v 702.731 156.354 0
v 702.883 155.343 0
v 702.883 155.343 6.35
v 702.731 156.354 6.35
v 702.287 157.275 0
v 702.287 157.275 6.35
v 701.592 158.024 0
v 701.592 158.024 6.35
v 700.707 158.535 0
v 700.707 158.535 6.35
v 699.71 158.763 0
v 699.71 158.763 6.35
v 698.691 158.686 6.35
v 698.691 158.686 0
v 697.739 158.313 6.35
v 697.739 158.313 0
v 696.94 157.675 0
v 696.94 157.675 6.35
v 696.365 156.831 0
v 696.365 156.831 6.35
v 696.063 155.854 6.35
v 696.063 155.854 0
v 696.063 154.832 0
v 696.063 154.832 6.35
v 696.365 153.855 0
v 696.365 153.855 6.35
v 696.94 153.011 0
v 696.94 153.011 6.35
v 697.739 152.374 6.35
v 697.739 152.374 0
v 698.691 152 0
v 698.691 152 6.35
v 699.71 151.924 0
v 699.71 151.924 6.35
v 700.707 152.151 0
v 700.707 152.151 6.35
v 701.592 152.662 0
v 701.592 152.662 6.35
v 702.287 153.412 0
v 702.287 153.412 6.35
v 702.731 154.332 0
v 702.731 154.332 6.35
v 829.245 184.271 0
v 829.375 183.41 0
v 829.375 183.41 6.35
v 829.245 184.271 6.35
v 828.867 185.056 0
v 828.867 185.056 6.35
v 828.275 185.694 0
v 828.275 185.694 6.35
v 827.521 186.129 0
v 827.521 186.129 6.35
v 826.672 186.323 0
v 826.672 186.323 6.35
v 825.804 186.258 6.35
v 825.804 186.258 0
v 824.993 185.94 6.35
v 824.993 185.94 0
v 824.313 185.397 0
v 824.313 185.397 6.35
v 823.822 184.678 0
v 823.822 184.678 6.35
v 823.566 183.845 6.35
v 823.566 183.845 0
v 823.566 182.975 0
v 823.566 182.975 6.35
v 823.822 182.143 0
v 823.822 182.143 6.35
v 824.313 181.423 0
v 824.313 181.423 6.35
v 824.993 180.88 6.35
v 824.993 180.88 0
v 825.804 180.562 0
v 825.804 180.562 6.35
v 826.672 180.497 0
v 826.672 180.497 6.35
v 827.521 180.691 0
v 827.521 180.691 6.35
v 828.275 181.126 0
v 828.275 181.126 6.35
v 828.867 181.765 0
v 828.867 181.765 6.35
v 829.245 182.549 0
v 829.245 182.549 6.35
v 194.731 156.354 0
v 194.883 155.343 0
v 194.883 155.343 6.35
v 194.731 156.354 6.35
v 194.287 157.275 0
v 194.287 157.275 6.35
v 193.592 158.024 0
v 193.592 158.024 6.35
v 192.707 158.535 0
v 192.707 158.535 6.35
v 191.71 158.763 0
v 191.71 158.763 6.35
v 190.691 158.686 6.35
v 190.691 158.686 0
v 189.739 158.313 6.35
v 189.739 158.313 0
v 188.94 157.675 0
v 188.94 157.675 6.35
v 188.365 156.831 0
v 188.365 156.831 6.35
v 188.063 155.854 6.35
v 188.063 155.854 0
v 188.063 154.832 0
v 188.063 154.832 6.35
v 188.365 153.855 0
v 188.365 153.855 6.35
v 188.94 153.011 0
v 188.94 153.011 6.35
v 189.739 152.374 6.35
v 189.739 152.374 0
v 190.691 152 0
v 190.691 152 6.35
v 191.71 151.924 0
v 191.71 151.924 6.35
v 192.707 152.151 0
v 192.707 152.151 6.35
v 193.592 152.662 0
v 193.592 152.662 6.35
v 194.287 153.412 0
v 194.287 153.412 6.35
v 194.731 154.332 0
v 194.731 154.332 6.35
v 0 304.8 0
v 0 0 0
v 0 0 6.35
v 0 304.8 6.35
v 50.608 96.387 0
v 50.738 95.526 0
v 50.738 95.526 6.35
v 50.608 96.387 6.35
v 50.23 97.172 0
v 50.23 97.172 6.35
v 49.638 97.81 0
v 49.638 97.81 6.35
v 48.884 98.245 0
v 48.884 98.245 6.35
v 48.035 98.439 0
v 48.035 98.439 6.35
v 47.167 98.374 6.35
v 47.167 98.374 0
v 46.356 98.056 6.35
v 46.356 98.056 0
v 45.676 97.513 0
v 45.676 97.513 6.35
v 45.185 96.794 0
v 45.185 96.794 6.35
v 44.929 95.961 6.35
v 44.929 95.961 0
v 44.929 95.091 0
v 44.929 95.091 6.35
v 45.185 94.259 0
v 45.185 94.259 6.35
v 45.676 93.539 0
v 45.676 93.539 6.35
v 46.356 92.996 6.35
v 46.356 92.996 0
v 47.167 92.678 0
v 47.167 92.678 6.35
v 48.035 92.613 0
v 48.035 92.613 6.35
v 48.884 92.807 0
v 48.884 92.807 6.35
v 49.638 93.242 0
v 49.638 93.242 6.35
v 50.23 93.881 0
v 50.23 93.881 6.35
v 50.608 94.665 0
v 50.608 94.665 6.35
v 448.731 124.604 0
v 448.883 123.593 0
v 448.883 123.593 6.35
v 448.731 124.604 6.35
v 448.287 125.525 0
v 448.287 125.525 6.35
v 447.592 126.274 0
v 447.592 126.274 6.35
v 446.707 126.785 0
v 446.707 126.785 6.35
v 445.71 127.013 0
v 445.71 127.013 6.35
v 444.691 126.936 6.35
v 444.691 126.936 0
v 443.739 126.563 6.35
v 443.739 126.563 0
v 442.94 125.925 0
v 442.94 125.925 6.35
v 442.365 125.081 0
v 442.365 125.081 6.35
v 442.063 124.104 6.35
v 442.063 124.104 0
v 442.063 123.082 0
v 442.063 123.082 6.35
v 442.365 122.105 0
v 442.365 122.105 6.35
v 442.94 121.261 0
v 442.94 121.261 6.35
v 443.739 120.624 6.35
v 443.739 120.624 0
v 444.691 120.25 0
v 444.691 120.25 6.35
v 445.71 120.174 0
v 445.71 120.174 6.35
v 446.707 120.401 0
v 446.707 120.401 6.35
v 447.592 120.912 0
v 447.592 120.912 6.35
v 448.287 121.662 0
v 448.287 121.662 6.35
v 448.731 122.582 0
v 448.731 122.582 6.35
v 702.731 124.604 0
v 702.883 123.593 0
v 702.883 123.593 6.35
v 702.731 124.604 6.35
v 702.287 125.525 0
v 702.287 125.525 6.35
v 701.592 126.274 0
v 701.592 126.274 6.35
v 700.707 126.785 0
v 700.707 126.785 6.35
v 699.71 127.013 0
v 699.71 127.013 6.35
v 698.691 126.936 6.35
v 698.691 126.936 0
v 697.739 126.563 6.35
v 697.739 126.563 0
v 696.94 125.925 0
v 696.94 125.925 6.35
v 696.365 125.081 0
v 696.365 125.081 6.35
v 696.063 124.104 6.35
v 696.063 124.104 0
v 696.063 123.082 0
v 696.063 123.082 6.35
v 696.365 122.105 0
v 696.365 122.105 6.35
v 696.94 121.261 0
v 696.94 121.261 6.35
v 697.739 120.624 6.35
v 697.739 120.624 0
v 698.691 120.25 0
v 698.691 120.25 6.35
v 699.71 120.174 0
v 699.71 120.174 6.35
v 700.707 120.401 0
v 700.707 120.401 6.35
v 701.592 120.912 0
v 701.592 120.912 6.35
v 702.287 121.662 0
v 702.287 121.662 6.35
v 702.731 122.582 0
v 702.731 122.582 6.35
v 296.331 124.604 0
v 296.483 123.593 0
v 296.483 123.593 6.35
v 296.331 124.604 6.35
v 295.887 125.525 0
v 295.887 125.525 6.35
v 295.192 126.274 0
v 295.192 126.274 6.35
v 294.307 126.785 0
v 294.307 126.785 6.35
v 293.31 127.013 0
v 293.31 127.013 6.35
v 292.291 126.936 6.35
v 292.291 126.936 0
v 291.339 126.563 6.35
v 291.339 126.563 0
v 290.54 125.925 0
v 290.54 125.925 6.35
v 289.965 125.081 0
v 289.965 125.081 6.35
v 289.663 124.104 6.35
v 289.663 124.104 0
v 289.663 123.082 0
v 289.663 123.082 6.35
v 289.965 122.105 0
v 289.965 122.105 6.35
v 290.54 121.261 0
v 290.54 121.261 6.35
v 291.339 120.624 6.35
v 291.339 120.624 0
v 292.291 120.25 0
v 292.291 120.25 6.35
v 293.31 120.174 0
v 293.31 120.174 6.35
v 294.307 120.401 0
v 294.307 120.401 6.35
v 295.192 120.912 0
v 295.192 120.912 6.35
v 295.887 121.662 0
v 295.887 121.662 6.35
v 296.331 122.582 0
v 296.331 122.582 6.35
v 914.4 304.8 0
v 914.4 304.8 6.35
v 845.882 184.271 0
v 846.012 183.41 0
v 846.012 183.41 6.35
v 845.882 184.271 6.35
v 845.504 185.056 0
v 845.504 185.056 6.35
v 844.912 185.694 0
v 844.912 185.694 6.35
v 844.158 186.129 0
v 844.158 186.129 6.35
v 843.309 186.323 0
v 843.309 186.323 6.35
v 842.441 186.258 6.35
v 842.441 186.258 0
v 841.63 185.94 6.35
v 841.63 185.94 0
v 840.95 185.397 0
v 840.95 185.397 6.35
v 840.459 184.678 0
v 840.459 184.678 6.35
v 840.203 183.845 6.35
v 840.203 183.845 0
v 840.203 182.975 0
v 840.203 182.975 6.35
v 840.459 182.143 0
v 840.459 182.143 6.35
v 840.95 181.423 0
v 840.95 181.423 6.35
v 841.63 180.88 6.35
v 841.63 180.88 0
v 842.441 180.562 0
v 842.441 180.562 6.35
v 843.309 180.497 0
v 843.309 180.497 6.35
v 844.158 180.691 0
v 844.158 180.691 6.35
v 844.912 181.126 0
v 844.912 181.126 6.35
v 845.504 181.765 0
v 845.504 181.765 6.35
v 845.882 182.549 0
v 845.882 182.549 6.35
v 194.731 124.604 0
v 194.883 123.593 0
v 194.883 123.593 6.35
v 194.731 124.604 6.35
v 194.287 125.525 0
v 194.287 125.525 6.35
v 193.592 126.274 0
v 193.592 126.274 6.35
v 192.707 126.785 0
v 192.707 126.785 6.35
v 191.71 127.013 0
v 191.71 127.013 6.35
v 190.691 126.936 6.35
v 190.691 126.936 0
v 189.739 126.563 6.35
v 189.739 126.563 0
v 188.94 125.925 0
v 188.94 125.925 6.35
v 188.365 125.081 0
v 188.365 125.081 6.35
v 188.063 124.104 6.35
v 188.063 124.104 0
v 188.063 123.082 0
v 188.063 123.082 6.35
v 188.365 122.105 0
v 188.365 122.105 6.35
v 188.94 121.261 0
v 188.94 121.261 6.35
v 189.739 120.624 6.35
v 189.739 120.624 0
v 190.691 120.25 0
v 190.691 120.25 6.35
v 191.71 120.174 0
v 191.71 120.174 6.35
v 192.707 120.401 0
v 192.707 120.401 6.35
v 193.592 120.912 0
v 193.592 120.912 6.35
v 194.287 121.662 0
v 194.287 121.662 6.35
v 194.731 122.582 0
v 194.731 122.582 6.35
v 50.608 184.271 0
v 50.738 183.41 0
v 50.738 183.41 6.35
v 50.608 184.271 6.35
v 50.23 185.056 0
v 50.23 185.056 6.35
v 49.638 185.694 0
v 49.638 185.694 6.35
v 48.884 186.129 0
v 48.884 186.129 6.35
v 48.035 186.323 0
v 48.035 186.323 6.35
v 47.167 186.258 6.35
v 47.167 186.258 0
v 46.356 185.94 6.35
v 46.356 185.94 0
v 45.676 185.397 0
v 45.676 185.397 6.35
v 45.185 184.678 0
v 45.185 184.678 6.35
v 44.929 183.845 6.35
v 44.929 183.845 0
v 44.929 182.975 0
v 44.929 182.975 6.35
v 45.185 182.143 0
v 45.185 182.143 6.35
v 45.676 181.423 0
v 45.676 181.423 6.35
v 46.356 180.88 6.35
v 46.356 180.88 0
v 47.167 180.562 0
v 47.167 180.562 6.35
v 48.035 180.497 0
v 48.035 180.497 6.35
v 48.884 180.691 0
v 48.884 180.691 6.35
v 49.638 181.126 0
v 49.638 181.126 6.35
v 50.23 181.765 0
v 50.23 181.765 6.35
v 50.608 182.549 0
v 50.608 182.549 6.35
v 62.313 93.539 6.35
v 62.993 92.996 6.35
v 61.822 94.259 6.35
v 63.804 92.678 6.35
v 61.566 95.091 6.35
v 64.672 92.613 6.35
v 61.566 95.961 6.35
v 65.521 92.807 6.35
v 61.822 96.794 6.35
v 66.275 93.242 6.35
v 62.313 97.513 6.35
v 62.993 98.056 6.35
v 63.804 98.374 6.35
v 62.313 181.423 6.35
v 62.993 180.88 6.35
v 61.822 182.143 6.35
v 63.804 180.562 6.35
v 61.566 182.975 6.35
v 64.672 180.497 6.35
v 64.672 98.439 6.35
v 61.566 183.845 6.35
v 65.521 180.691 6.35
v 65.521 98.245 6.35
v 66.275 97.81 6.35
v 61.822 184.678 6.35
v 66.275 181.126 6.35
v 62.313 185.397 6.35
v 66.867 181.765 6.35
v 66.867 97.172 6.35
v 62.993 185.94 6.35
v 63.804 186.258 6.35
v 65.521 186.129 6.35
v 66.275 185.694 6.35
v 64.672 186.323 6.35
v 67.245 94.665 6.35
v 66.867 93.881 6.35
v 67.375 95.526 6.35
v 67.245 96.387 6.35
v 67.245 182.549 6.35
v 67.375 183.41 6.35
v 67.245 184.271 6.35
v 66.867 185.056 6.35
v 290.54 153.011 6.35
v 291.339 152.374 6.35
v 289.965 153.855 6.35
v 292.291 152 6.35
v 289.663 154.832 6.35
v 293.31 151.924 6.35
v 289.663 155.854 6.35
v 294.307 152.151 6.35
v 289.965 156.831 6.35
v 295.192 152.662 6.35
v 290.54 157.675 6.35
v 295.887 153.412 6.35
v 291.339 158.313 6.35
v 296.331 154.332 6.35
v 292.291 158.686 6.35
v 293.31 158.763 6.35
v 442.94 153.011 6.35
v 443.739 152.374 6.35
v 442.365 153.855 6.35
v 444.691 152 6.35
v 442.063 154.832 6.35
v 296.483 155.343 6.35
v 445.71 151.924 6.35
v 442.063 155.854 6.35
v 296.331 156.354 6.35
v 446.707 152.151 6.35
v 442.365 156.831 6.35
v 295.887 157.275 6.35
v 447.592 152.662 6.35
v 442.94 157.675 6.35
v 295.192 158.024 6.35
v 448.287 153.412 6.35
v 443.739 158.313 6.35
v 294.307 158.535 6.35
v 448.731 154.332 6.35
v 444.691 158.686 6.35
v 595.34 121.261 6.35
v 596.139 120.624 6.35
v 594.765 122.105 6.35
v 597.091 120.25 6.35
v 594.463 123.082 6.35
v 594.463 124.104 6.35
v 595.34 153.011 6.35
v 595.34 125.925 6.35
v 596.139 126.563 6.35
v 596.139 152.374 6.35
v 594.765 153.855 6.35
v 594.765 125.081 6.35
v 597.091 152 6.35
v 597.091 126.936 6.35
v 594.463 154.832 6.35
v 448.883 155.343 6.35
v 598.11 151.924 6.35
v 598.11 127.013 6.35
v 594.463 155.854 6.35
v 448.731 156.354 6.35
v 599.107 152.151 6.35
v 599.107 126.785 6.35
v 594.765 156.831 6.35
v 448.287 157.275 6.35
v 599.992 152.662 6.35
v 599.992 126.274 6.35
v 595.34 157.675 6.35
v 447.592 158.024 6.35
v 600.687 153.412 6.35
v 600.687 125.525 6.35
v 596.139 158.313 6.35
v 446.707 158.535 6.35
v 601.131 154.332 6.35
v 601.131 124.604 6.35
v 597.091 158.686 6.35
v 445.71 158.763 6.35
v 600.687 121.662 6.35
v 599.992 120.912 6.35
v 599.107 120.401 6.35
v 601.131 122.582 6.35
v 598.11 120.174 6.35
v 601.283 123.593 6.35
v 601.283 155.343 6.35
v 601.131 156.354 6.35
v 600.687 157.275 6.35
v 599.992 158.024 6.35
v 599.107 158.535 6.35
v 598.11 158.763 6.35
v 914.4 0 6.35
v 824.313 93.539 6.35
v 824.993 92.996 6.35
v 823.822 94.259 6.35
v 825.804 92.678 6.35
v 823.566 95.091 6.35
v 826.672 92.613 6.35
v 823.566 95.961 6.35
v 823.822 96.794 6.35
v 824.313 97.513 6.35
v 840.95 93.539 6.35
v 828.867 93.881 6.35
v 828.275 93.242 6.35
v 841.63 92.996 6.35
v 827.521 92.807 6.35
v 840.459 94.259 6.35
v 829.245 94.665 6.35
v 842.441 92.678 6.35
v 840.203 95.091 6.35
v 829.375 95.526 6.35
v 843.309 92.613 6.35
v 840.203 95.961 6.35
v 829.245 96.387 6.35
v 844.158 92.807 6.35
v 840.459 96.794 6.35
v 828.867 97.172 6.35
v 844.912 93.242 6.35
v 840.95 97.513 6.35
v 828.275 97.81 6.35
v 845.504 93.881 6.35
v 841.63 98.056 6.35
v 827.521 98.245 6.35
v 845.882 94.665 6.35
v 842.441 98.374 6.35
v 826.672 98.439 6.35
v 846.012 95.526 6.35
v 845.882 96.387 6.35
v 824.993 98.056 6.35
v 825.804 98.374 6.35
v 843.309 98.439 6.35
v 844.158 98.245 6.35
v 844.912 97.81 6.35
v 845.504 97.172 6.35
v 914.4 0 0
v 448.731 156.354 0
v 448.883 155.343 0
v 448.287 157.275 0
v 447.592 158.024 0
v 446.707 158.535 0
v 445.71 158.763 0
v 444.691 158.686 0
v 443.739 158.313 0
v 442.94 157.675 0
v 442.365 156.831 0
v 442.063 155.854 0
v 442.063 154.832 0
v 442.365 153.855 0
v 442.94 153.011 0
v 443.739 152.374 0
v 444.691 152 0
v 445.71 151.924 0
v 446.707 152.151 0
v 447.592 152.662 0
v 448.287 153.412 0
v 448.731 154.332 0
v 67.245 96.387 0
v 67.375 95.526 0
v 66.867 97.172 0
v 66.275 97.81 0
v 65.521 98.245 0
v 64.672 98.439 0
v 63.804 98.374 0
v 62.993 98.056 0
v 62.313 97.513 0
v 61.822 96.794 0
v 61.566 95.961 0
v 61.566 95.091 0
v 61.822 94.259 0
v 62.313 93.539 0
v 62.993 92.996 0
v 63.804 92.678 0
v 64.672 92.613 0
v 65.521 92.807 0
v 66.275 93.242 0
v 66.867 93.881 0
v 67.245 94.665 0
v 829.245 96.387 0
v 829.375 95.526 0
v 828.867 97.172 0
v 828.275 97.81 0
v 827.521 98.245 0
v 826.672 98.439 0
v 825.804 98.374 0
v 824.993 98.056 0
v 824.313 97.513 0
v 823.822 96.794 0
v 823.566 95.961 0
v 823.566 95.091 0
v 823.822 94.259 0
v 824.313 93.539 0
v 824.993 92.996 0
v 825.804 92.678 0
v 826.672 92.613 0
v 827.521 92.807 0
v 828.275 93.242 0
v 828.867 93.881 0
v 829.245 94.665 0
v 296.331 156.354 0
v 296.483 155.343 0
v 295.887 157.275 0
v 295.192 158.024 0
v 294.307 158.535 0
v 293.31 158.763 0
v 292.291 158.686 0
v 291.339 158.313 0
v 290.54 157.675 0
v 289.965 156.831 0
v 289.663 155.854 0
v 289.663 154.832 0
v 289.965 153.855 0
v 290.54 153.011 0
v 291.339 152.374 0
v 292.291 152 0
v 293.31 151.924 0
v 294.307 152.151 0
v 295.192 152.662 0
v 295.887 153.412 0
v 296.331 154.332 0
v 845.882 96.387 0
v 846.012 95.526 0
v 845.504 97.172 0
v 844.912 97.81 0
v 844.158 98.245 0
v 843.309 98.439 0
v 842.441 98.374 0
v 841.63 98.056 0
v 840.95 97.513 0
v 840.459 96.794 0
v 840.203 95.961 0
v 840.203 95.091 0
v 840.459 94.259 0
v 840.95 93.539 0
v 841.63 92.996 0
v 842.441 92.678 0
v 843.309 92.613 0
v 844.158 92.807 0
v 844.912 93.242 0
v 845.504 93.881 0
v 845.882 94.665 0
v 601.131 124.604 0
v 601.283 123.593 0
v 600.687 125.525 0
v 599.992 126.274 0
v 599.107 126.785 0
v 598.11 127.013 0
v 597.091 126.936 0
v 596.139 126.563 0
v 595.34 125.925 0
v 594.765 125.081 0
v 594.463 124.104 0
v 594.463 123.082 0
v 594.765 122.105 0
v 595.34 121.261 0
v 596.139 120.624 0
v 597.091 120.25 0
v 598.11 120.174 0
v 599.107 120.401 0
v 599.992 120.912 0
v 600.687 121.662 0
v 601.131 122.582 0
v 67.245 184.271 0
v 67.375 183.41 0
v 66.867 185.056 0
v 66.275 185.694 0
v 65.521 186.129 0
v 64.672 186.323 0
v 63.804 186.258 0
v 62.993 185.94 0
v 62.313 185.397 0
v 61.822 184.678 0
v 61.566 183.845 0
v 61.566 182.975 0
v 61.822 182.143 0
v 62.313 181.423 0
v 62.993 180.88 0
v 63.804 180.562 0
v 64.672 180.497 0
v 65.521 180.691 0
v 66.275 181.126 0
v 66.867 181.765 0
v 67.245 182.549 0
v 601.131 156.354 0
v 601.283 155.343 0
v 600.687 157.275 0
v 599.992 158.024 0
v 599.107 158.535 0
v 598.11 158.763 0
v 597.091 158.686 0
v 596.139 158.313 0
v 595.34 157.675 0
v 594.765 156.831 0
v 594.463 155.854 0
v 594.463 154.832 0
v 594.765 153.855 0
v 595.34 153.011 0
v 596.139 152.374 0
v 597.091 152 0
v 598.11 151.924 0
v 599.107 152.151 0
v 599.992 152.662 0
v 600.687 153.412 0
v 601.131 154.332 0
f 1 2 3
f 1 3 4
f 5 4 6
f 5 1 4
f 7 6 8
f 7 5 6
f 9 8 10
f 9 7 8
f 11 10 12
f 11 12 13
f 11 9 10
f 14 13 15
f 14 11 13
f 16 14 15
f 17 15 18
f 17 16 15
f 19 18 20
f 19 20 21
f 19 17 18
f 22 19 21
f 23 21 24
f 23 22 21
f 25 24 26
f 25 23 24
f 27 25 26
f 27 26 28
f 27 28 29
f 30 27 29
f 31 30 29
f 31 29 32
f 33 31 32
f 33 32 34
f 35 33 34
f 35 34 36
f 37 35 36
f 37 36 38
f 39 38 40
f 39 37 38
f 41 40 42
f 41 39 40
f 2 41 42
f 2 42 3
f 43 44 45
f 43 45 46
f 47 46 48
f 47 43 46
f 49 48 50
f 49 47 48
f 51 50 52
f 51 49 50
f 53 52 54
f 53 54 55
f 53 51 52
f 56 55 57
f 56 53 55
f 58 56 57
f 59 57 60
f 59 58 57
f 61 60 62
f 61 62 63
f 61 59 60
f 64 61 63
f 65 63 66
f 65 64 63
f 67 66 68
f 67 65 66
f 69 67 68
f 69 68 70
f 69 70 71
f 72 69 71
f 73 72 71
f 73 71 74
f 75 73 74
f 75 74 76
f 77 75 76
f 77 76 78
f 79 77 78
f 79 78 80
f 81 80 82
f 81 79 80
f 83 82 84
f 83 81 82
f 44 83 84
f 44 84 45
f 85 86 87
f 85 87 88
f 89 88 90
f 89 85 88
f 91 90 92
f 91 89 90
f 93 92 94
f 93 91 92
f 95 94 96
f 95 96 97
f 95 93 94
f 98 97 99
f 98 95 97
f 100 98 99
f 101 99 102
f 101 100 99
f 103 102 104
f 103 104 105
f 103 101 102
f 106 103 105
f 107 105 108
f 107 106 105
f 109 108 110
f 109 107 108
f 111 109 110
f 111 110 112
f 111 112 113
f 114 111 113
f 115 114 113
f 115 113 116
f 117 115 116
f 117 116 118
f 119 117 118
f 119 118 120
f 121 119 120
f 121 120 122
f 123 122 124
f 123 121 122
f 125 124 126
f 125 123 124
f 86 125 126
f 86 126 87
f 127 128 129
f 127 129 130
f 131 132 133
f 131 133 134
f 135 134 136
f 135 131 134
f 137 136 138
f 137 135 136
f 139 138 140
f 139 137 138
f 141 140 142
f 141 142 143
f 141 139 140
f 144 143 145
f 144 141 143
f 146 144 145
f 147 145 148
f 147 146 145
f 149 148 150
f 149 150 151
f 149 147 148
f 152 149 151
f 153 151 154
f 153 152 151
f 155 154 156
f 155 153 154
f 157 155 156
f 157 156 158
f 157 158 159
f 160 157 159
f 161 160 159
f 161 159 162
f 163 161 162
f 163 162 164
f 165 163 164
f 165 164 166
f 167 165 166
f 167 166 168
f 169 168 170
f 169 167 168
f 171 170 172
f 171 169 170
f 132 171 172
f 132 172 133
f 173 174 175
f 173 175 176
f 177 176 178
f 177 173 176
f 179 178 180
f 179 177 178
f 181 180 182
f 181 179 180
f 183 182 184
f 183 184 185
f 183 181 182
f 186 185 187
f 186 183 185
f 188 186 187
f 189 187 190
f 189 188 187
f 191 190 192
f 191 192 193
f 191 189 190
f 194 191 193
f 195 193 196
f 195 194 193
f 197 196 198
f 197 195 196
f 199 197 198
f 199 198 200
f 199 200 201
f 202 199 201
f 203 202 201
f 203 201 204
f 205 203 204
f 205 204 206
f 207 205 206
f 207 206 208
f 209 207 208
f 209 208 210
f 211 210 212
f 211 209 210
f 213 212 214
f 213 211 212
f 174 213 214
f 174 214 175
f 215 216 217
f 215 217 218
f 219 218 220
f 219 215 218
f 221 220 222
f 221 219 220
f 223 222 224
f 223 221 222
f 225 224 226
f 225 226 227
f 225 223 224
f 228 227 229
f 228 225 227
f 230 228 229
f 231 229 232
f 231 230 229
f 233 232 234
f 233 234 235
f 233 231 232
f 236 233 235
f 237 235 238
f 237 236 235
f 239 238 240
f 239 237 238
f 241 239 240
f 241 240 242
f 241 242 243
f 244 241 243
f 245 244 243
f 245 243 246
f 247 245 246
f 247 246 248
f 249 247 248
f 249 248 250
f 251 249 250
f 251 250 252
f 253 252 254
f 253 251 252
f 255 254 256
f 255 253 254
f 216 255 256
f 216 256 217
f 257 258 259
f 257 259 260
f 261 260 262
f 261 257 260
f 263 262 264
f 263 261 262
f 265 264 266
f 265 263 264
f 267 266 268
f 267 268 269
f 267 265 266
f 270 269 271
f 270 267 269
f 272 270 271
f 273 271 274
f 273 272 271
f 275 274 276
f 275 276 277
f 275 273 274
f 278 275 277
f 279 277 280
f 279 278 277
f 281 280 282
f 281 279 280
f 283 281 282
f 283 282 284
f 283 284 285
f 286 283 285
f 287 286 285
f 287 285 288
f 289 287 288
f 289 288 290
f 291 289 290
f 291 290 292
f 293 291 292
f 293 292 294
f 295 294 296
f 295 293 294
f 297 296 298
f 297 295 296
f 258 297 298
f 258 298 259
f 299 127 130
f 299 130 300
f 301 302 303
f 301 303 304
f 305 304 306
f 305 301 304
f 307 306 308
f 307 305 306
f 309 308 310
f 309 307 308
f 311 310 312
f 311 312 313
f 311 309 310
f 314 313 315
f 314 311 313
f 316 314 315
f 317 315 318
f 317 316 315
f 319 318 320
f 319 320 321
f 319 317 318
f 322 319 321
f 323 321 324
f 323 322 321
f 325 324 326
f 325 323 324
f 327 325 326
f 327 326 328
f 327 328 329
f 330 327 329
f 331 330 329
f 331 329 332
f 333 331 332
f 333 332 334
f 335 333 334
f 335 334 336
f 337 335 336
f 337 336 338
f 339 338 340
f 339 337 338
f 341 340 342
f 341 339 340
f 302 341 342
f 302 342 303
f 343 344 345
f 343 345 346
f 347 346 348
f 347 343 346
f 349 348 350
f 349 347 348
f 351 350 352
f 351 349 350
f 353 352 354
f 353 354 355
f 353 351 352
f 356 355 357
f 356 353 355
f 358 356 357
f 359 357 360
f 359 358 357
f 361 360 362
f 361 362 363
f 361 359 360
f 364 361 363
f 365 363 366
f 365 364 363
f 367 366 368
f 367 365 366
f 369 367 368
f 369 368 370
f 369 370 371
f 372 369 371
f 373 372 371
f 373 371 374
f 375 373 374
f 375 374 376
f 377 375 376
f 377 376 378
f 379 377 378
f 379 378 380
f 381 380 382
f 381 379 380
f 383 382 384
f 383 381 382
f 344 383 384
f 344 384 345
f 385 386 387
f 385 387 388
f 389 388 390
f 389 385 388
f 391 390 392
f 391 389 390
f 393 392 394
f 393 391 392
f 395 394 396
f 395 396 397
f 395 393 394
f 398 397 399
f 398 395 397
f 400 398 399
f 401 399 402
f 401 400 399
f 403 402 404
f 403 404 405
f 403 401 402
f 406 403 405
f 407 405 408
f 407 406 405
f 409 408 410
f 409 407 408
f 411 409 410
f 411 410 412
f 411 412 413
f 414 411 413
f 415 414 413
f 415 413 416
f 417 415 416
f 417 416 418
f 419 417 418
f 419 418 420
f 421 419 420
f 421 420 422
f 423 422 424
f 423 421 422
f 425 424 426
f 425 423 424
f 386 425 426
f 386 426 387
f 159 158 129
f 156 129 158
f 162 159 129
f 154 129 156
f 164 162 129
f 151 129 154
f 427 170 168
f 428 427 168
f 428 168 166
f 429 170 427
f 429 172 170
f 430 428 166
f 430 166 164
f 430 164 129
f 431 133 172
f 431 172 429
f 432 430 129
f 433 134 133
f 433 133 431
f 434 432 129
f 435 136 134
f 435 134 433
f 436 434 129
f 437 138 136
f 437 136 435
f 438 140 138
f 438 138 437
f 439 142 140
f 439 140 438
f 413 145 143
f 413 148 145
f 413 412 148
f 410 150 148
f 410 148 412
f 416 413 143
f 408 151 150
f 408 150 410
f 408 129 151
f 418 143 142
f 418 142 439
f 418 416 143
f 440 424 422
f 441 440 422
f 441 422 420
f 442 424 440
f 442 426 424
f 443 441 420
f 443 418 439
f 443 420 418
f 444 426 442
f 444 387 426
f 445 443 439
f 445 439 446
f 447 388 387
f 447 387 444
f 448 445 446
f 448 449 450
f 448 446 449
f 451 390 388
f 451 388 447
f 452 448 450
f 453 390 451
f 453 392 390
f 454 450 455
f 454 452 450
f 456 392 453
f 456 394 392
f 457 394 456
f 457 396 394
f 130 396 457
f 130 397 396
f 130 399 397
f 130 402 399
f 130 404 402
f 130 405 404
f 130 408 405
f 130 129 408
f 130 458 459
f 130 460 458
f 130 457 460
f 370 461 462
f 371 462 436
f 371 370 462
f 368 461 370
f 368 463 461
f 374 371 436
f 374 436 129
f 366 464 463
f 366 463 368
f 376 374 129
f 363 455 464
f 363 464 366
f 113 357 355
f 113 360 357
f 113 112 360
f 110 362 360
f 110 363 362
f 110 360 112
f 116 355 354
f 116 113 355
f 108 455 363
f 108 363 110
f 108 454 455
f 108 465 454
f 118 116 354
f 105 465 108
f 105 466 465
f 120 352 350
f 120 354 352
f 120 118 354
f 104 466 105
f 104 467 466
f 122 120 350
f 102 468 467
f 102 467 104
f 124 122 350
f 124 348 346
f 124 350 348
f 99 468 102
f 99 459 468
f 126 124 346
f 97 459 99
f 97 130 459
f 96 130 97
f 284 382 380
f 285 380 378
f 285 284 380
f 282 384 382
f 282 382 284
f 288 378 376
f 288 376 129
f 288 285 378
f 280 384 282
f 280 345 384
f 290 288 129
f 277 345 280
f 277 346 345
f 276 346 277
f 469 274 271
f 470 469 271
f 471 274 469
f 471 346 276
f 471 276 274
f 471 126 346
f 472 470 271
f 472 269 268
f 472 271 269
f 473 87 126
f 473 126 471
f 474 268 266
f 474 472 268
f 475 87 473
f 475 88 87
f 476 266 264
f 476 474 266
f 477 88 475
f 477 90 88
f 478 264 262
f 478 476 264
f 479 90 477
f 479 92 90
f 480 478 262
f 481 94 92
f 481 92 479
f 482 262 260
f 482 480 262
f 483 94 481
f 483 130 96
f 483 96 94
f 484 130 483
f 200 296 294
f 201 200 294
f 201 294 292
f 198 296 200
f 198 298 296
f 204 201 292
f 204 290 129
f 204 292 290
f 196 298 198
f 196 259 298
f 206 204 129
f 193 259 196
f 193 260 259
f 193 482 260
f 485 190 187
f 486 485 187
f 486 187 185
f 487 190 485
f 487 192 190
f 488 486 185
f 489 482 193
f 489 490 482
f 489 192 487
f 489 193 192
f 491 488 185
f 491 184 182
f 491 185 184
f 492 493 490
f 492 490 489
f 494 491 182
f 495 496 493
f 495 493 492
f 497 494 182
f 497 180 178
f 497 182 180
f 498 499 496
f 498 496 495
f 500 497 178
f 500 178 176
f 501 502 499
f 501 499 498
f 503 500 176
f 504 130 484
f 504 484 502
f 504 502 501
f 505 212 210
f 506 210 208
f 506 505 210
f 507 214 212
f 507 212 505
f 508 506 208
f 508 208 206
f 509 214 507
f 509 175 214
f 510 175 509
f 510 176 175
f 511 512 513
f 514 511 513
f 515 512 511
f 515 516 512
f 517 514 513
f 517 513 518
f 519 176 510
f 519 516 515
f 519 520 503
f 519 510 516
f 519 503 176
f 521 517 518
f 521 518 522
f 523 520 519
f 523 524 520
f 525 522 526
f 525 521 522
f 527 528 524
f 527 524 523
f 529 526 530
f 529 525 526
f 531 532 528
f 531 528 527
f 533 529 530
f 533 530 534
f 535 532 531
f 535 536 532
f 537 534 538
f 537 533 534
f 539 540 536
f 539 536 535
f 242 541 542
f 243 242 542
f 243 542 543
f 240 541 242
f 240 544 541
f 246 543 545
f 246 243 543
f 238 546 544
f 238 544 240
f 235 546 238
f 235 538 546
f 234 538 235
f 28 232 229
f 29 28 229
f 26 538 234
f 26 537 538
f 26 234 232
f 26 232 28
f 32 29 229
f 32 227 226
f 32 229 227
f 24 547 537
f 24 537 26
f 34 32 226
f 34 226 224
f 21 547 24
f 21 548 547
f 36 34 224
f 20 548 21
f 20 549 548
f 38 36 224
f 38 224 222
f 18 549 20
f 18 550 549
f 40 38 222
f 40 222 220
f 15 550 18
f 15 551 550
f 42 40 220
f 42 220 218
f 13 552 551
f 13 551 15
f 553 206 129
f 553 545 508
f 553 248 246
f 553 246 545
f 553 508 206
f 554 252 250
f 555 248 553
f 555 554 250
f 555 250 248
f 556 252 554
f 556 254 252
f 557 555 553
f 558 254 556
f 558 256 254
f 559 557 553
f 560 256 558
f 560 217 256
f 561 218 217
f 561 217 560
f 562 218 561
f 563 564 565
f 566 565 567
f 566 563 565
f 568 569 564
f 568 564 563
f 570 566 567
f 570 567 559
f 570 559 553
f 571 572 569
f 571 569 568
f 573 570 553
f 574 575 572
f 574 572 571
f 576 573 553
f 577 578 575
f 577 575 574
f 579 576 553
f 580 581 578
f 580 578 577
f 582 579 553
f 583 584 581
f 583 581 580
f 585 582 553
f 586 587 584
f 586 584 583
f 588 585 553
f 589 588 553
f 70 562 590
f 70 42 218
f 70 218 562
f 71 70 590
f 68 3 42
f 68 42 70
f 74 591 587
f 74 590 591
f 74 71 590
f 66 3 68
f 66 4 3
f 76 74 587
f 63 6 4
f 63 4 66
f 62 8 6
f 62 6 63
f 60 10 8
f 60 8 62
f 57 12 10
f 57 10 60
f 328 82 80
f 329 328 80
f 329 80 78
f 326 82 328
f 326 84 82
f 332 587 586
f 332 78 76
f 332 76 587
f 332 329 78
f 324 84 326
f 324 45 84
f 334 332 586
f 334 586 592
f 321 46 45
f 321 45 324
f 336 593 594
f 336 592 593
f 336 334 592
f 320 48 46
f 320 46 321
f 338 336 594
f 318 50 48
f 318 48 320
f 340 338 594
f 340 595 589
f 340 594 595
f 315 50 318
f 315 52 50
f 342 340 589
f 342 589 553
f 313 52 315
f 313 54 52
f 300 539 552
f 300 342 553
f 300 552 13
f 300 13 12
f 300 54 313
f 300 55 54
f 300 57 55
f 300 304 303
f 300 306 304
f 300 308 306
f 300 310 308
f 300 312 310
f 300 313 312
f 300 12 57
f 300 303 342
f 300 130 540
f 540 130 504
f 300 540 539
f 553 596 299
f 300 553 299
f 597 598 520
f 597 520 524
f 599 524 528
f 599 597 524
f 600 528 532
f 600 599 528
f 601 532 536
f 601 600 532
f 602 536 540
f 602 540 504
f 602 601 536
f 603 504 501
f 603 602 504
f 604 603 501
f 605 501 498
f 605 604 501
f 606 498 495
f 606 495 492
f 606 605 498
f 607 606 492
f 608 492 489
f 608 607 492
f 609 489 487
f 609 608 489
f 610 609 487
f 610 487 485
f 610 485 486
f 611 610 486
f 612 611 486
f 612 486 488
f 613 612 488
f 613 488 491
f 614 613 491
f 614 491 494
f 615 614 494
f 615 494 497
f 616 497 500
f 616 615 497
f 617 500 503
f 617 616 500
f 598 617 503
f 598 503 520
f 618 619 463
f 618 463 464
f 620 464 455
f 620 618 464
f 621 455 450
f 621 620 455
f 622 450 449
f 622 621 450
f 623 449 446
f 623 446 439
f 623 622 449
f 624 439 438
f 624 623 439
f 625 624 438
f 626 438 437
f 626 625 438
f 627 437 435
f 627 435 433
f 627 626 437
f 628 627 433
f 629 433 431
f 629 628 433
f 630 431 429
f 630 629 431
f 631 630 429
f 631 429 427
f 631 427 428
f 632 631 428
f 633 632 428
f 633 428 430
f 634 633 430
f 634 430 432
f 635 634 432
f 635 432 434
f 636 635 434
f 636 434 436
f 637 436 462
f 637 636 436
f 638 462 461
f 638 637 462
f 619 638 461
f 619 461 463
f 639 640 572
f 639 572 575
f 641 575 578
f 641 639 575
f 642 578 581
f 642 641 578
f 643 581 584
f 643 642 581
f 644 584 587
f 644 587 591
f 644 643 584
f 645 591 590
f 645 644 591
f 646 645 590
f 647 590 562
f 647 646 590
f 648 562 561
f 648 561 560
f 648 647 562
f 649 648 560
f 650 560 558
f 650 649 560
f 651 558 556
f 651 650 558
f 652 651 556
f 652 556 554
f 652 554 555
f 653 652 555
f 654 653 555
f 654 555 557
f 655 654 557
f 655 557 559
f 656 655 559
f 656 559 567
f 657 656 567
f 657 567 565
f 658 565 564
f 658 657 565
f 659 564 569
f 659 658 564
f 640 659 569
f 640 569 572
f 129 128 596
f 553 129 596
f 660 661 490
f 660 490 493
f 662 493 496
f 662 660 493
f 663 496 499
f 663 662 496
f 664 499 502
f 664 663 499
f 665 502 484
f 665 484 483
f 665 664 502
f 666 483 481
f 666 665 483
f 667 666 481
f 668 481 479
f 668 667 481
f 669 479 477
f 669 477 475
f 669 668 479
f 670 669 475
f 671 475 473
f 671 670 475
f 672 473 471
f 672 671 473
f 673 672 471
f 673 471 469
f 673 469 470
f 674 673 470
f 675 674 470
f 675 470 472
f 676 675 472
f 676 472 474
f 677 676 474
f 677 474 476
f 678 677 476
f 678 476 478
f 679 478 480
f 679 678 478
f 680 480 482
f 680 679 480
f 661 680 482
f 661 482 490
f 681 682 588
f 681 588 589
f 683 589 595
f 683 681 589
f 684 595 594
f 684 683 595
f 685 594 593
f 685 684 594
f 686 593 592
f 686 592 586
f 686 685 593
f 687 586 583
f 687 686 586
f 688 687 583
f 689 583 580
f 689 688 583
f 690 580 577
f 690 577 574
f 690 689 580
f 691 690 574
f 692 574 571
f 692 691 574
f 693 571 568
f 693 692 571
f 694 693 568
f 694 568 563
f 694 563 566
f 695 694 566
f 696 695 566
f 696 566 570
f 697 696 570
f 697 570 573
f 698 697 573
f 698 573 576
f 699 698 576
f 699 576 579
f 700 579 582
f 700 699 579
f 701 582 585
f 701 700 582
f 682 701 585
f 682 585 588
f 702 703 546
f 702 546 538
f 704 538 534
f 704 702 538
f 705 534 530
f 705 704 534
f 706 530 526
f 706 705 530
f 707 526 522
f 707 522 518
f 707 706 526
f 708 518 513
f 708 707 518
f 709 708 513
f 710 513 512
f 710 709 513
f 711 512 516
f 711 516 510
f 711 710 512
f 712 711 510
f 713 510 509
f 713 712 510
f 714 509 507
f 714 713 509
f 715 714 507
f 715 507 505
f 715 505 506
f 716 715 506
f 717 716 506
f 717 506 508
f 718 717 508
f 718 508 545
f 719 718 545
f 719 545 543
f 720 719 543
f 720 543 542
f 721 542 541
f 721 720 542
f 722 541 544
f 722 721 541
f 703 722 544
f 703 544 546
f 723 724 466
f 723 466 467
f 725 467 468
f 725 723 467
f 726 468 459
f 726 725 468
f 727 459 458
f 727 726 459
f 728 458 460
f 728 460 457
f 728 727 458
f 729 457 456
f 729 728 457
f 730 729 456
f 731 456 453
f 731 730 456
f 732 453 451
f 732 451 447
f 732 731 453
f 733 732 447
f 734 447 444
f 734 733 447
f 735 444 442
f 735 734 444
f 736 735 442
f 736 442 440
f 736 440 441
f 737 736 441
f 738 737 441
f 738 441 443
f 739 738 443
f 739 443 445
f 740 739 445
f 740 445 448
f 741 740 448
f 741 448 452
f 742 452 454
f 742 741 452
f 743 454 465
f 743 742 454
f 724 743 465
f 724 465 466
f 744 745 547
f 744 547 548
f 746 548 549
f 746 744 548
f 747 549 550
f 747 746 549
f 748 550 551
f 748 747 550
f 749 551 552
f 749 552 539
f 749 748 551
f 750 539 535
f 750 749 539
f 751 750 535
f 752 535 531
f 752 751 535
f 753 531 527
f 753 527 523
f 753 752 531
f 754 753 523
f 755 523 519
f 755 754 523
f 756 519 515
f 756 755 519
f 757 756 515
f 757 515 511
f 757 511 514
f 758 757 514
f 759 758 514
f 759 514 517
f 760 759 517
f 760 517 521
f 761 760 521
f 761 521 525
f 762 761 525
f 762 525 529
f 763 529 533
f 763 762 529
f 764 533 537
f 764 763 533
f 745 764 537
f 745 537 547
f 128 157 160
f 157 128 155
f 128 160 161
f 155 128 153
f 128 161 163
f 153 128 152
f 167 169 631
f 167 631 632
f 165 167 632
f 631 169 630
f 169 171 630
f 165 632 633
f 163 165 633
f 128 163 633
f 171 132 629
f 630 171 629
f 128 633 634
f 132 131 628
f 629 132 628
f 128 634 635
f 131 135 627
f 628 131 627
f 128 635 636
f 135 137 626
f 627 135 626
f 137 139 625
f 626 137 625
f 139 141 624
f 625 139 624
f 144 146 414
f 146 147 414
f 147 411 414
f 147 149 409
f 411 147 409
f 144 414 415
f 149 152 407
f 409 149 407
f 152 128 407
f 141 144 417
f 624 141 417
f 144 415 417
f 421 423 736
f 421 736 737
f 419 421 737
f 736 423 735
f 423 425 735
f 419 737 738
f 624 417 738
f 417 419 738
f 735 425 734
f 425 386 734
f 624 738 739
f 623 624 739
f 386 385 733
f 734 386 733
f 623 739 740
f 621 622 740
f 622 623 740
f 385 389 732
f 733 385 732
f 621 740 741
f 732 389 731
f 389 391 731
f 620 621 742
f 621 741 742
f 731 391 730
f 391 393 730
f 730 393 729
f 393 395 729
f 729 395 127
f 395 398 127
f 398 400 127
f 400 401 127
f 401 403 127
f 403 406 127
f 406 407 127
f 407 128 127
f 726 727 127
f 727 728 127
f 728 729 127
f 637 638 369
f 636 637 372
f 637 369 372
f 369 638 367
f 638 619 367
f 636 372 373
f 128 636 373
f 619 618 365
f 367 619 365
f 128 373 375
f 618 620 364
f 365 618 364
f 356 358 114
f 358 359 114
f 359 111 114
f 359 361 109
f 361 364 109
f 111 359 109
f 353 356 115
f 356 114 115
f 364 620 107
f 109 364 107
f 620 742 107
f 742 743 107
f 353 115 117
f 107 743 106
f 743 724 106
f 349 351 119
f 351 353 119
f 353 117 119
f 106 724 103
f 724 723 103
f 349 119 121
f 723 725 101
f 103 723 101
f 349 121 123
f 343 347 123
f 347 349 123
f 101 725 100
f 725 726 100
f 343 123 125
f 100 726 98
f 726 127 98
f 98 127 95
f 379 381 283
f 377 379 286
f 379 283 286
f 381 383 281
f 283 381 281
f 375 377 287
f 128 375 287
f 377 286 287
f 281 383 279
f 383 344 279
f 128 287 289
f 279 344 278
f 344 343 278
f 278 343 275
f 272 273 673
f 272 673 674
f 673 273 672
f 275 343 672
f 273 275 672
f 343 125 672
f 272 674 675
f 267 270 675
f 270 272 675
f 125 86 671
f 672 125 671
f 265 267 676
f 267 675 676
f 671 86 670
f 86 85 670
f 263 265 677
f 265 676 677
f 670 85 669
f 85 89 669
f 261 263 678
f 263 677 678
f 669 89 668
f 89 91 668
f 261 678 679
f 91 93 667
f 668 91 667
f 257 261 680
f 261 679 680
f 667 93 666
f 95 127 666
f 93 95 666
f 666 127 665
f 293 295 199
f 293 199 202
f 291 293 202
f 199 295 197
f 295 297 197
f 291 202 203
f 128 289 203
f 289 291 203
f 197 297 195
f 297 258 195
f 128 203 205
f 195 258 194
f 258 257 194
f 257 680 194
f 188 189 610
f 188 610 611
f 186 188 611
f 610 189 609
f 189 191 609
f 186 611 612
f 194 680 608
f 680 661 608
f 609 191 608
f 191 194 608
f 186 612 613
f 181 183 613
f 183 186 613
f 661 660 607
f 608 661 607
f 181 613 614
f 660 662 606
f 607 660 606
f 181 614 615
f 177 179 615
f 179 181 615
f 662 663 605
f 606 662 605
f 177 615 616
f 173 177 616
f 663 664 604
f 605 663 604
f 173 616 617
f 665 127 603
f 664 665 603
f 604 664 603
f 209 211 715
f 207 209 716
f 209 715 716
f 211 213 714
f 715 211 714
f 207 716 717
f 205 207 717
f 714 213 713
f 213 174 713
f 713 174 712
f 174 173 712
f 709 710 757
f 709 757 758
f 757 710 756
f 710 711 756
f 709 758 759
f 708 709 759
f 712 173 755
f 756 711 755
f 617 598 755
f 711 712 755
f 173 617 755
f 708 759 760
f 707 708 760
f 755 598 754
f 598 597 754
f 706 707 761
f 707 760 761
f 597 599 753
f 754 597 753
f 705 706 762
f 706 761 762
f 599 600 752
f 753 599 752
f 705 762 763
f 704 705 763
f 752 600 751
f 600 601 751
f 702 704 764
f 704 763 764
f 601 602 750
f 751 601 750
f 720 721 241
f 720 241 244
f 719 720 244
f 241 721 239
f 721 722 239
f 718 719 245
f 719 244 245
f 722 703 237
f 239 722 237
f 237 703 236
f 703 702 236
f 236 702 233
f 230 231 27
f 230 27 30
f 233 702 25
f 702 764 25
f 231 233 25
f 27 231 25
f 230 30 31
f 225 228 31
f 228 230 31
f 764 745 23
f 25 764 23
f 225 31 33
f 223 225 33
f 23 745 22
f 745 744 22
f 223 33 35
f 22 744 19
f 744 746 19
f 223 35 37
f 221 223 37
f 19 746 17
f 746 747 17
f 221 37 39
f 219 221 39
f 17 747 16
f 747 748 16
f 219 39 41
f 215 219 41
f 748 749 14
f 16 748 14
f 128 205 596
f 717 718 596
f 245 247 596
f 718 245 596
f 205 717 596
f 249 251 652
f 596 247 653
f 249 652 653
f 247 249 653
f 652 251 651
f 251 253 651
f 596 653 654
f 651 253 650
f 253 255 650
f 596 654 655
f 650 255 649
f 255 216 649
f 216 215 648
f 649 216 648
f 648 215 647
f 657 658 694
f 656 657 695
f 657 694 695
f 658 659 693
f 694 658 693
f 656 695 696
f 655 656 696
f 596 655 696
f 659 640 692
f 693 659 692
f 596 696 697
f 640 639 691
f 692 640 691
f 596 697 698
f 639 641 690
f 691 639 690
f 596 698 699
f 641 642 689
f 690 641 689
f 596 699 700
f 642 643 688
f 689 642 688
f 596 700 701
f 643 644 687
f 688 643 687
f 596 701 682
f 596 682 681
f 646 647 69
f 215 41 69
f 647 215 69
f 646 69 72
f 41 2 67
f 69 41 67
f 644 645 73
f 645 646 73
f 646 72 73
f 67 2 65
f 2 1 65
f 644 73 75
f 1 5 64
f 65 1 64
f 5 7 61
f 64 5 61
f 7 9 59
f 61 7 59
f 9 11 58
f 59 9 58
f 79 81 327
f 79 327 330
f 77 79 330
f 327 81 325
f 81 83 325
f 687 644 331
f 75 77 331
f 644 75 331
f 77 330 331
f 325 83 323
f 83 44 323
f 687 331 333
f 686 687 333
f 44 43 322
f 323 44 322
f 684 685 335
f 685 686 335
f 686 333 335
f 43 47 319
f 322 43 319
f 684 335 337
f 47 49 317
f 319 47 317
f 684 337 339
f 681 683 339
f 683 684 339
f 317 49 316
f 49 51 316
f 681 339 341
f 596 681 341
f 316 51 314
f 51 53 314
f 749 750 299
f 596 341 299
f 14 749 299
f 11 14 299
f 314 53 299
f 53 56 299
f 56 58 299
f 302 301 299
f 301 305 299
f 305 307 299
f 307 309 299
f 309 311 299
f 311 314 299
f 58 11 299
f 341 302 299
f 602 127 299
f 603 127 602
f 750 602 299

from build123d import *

# Parameters (mm, degrees)
SKETCH1_W           = 914.4
SKETCH1_H           = 304.8
SKETCH1_R           = 3.429
SKETCH1_R_2         = 2.921
BOSS_EXTRUDE1_DEPTH = 6.35


with BuildPart() as part:
    # Sketch1 → Boss-Extrude1 (new body)
    with BuildSketch(Plane.XY):
        with Locations((457.2, 152.4)):
            Rectangle(SKETCH1_W, SKETCH1_H)
        with Locations((445.453955885, 155.343145215)):
            Circle(SKETCH1_R, mode=Mode.SUBTRACT)
        with Locations((445.453955885, 123.593145215)):
            Circle(SKETCH1_R, mode=Mode.SUBTRACT)
        with Locations((597.853955885, 155.343145215)):
            Circle(SKETCH1_R, mode=Mode.SUBTRACT)
        with Locations((597.853955885, 123.593145215)):
            Circle(SKETCH1_R, mode=Mode.SUBTRACT)
        with Locations((699.453955885, 155.343145215)):
            Circle(SKETCH1_R, mode=Mode.SUBTRACT)
        with Locations((699.453955885, 123.593145215)):
            Circle(SKETCH1_R, mode=Mode.SUBTRACT)
        with Locations((293.053955885, 155.343145215)):
            Circle(SKETCH1_R, mode=Mode.SUBTRACT)
        with Locations((293.053955885, 123.593145215)):
            Circle(SKETCH1_R, mode=Mode.SUBTRACT)
        with Locations((191.453955885, 155.343145215)):
            Circle(SKETCH1_R, mode=Mode.SUBTRACT)
        with Locations((191.453955885, 123.593145215)):
            Circle(SKETCH1_R, mode=Mode.SUBTRACT)
        with Locations((47.816955885, 183.410145215)):
            Circle(SKETCH1_R_2, mode=Mode.SUBTRACT)
        with Locations((64.453955885, 183.410145215)):
            Circle(SKETCH1_R_2, mode=Mode.SUBTRACT)
        with Locations((47.816955885, 95.526145215)):
            Circle(SKETCH1_R_2, mode=Mode.SUBTRACT)
        with Locations((64.453955885, 95.526145215)):
            Circle(SKETCH1_R_2, mode=Mode.SUBTRACT)
        with Locations((826.453955885, 183.410145215)):
            Circle(SKETCH1_R_2, mode=Mode.SUBTRACT)
        with Locations((843.090955885, 183.410145215)):
            Circle(SKETCH1_R_2, mode=Mode.SUBTRACT)
        with Locations((826.453955885, 95.526145215)):
            Circle(SKETCH1_R_2, mode=Mode.SUBTRACT)
        with Locations((843.090955885, 95.526145215)):
            Circle(SKETCH1_R_2, mode=Mode.SUBTRACT)
    extrude(amount=BOSS_EXTRUDE1_DEPTH)


solid = part.part
